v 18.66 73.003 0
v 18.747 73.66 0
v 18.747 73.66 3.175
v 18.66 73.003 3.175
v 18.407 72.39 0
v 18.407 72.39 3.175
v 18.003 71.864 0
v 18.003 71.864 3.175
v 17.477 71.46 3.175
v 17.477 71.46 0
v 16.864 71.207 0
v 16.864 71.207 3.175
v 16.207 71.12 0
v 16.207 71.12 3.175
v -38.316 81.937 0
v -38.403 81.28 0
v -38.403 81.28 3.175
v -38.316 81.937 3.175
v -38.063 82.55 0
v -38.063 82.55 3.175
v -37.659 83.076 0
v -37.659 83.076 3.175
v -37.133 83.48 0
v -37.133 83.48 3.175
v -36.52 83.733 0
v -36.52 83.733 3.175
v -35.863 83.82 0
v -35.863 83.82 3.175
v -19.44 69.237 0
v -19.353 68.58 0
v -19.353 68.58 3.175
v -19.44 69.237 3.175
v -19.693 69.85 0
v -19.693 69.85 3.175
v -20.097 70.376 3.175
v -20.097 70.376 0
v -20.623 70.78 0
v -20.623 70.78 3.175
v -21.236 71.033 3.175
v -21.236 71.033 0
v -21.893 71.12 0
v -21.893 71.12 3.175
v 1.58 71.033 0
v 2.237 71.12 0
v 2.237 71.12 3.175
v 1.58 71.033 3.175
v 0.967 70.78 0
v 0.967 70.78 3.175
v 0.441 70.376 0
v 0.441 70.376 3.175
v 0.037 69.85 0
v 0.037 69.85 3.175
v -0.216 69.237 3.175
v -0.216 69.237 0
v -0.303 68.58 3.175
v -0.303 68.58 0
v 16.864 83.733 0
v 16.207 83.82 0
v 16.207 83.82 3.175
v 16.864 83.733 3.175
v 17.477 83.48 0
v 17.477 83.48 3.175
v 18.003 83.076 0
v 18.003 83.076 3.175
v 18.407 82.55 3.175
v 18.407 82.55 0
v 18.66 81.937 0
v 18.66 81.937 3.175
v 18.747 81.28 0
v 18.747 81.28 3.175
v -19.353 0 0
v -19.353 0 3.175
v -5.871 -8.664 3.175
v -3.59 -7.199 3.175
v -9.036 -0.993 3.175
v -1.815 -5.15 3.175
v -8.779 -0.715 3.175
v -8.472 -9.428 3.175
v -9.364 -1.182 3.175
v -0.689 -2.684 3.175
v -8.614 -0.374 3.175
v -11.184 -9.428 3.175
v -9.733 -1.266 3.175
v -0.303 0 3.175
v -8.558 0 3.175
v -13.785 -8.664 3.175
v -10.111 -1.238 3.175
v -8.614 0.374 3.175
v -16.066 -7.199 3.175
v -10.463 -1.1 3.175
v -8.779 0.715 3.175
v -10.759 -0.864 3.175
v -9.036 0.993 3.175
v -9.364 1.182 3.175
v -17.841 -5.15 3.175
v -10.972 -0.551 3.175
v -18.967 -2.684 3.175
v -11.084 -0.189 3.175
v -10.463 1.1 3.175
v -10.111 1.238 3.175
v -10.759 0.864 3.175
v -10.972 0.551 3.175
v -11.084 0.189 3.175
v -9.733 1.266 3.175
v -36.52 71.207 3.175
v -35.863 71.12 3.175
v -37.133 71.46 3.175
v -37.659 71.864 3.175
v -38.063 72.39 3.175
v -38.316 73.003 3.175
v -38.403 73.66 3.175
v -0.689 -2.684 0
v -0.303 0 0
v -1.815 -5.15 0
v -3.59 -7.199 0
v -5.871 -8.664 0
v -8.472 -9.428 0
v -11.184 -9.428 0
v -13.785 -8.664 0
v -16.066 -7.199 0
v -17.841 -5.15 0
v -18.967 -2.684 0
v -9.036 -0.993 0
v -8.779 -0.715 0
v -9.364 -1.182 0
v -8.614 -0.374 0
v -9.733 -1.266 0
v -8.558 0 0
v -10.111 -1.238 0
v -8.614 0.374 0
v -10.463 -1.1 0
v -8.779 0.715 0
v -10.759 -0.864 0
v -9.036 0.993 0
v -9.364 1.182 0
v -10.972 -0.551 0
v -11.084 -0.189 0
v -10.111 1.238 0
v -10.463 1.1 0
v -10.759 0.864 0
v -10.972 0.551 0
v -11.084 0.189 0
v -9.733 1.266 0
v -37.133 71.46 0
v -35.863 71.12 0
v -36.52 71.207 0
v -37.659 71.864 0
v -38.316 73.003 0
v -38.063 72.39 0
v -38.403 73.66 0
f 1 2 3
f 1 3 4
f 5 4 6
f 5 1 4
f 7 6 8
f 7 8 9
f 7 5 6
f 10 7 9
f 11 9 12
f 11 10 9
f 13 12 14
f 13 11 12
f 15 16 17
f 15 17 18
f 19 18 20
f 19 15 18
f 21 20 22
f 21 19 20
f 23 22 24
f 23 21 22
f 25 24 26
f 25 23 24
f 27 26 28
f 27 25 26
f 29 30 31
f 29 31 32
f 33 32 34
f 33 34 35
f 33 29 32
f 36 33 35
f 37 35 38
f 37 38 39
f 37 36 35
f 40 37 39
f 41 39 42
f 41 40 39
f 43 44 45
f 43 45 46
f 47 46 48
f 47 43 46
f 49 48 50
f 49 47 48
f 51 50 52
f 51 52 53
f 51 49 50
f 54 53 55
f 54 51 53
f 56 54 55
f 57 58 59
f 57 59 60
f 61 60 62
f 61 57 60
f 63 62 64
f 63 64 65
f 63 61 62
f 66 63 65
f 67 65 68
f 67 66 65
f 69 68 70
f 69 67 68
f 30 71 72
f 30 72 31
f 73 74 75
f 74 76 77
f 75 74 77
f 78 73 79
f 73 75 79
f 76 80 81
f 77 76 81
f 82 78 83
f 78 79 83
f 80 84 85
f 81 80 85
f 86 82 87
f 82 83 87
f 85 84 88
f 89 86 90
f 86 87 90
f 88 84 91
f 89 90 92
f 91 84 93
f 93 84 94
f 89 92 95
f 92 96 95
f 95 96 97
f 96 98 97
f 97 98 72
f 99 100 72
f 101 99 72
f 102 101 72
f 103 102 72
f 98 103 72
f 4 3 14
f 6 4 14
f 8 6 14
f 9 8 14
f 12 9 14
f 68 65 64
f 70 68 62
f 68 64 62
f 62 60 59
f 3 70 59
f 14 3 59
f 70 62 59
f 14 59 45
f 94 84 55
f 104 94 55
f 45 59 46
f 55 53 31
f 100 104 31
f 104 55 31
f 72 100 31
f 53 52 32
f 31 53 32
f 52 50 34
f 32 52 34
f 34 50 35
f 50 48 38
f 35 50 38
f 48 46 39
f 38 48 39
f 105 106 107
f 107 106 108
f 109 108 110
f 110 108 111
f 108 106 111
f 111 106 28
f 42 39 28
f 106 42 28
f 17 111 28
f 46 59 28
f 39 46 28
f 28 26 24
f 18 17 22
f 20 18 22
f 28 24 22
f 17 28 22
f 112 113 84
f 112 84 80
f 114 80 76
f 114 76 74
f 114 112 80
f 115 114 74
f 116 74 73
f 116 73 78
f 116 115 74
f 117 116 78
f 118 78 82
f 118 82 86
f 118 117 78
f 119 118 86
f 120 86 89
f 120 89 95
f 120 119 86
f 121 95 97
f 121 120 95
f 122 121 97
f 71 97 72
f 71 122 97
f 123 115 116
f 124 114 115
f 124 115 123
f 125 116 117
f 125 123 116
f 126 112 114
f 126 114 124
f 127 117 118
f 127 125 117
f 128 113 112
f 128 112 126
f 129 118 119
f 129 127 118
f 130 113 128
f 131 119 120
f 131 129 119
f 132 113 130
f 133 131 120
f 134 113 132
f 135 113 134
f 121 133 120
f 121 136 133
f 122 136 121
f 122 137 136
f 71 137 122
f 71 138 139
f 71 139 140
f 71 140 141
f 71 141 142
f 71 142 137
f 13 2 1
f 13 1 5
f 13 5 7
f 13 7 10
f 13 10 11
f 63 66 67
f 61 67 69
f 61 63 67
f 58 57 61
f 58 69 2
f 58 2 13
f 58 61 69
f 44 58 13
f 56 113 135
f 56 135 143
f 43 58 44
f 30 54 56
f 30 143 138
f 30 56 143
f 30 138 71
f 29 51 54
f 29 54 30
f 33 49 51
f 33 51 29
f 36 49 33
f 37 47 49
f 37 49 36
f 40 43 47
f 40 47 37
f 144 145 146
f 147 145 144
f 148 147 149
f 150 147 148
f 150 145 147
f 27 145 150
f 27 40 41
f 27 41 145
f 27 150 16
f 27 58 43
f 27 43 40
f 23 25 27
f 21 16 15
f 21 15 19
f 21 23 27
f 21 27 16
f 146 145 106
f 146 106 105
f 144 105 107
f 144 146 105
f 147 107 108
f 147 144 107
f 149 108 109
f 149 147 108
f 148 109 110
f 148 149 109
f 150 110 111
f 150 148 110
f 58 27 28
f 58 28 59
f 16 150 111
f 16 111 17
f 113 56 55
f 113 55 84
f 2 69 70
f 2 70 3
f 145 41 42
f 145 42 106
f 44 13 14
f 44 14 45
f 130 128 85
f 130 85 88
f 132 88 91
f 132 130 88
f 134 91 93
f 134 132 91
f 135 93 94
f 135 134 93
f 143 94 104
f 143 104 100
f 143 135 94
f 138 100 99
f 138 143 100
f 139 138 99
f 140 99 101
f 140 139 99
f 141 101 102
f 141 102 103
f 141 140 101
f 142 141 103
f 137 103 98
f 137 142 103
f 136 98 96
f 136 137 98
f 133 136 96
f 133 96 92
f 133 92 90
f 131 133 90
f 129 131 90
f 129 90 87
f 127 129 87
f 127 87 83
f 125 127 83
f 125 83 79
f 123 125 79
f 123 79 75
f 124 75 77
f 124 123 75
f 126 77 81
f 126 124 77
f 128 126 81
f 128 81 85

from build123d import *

# Parameters (mm, degrees)
SKETCH1_R           = 1.27
BOSS_EXTRUDE1_DEPTH = 3.175


with BuildPart() as part:
    # Sketch1 → Boss-Extrude1 (new body)
    with BuildSketch(Plane.XY):
        with BuildLine():
            Line((-19.353012887, 0), (-19.353012887, 68.58))
            ThreePointArc((-19.353012887, 68.58), (-20.096961663, 70.376051224), (-21.893012887, 71.12))
            Line((-21.893012887, 71.12), (-35.863012887, 71.12))
            ThreePointArc((-35.863012887, 71.12), (-37.659064112, 71.863948776), (-38.403012887, 73.66))
            Line((-38.403012887, 73.66), (-38.403012887, 81.28))
            ThreePointArc((-38.403012887, 81.28), (-37.659064112, 83.076051224), (-35.863012887, 83.82))
            Line((-35.863012887, 83.82), (16.206987113, 83.82))
            ThreePointArc((16.206987113, 83.82), (18.003038337, 83.076051224), (18.746987113, 81.28))
            Line((18.746987113, 81.28), (18.746987113, 73.66))
            ThreePointArc((18.746987113, 73.66), (18.003038337, 71.863948776), (16.206987113, 71.12))
            Line((16.206987113, 71.12), (2.236987113, 71.12))
            ThreePointArc((2.236987113, 71.12), (0.440935888, 70.376051224), (-0.303012887, 68.58))
            Line((-0.303012887, 68.58), (-0.303012887, 0))
            ThreePointArc((-0.303012887, 0), (-9.828012887, -9.525), (-19.353012887, 0))
        make_face()
        with Locations((-9.828012887, 0)):
            Circle(SKETCH1_R, mode=Mode.SUBTRACT)
    extrude(amount=BOSS_EXTRUDE1_DEPTH)


solid = part.part
